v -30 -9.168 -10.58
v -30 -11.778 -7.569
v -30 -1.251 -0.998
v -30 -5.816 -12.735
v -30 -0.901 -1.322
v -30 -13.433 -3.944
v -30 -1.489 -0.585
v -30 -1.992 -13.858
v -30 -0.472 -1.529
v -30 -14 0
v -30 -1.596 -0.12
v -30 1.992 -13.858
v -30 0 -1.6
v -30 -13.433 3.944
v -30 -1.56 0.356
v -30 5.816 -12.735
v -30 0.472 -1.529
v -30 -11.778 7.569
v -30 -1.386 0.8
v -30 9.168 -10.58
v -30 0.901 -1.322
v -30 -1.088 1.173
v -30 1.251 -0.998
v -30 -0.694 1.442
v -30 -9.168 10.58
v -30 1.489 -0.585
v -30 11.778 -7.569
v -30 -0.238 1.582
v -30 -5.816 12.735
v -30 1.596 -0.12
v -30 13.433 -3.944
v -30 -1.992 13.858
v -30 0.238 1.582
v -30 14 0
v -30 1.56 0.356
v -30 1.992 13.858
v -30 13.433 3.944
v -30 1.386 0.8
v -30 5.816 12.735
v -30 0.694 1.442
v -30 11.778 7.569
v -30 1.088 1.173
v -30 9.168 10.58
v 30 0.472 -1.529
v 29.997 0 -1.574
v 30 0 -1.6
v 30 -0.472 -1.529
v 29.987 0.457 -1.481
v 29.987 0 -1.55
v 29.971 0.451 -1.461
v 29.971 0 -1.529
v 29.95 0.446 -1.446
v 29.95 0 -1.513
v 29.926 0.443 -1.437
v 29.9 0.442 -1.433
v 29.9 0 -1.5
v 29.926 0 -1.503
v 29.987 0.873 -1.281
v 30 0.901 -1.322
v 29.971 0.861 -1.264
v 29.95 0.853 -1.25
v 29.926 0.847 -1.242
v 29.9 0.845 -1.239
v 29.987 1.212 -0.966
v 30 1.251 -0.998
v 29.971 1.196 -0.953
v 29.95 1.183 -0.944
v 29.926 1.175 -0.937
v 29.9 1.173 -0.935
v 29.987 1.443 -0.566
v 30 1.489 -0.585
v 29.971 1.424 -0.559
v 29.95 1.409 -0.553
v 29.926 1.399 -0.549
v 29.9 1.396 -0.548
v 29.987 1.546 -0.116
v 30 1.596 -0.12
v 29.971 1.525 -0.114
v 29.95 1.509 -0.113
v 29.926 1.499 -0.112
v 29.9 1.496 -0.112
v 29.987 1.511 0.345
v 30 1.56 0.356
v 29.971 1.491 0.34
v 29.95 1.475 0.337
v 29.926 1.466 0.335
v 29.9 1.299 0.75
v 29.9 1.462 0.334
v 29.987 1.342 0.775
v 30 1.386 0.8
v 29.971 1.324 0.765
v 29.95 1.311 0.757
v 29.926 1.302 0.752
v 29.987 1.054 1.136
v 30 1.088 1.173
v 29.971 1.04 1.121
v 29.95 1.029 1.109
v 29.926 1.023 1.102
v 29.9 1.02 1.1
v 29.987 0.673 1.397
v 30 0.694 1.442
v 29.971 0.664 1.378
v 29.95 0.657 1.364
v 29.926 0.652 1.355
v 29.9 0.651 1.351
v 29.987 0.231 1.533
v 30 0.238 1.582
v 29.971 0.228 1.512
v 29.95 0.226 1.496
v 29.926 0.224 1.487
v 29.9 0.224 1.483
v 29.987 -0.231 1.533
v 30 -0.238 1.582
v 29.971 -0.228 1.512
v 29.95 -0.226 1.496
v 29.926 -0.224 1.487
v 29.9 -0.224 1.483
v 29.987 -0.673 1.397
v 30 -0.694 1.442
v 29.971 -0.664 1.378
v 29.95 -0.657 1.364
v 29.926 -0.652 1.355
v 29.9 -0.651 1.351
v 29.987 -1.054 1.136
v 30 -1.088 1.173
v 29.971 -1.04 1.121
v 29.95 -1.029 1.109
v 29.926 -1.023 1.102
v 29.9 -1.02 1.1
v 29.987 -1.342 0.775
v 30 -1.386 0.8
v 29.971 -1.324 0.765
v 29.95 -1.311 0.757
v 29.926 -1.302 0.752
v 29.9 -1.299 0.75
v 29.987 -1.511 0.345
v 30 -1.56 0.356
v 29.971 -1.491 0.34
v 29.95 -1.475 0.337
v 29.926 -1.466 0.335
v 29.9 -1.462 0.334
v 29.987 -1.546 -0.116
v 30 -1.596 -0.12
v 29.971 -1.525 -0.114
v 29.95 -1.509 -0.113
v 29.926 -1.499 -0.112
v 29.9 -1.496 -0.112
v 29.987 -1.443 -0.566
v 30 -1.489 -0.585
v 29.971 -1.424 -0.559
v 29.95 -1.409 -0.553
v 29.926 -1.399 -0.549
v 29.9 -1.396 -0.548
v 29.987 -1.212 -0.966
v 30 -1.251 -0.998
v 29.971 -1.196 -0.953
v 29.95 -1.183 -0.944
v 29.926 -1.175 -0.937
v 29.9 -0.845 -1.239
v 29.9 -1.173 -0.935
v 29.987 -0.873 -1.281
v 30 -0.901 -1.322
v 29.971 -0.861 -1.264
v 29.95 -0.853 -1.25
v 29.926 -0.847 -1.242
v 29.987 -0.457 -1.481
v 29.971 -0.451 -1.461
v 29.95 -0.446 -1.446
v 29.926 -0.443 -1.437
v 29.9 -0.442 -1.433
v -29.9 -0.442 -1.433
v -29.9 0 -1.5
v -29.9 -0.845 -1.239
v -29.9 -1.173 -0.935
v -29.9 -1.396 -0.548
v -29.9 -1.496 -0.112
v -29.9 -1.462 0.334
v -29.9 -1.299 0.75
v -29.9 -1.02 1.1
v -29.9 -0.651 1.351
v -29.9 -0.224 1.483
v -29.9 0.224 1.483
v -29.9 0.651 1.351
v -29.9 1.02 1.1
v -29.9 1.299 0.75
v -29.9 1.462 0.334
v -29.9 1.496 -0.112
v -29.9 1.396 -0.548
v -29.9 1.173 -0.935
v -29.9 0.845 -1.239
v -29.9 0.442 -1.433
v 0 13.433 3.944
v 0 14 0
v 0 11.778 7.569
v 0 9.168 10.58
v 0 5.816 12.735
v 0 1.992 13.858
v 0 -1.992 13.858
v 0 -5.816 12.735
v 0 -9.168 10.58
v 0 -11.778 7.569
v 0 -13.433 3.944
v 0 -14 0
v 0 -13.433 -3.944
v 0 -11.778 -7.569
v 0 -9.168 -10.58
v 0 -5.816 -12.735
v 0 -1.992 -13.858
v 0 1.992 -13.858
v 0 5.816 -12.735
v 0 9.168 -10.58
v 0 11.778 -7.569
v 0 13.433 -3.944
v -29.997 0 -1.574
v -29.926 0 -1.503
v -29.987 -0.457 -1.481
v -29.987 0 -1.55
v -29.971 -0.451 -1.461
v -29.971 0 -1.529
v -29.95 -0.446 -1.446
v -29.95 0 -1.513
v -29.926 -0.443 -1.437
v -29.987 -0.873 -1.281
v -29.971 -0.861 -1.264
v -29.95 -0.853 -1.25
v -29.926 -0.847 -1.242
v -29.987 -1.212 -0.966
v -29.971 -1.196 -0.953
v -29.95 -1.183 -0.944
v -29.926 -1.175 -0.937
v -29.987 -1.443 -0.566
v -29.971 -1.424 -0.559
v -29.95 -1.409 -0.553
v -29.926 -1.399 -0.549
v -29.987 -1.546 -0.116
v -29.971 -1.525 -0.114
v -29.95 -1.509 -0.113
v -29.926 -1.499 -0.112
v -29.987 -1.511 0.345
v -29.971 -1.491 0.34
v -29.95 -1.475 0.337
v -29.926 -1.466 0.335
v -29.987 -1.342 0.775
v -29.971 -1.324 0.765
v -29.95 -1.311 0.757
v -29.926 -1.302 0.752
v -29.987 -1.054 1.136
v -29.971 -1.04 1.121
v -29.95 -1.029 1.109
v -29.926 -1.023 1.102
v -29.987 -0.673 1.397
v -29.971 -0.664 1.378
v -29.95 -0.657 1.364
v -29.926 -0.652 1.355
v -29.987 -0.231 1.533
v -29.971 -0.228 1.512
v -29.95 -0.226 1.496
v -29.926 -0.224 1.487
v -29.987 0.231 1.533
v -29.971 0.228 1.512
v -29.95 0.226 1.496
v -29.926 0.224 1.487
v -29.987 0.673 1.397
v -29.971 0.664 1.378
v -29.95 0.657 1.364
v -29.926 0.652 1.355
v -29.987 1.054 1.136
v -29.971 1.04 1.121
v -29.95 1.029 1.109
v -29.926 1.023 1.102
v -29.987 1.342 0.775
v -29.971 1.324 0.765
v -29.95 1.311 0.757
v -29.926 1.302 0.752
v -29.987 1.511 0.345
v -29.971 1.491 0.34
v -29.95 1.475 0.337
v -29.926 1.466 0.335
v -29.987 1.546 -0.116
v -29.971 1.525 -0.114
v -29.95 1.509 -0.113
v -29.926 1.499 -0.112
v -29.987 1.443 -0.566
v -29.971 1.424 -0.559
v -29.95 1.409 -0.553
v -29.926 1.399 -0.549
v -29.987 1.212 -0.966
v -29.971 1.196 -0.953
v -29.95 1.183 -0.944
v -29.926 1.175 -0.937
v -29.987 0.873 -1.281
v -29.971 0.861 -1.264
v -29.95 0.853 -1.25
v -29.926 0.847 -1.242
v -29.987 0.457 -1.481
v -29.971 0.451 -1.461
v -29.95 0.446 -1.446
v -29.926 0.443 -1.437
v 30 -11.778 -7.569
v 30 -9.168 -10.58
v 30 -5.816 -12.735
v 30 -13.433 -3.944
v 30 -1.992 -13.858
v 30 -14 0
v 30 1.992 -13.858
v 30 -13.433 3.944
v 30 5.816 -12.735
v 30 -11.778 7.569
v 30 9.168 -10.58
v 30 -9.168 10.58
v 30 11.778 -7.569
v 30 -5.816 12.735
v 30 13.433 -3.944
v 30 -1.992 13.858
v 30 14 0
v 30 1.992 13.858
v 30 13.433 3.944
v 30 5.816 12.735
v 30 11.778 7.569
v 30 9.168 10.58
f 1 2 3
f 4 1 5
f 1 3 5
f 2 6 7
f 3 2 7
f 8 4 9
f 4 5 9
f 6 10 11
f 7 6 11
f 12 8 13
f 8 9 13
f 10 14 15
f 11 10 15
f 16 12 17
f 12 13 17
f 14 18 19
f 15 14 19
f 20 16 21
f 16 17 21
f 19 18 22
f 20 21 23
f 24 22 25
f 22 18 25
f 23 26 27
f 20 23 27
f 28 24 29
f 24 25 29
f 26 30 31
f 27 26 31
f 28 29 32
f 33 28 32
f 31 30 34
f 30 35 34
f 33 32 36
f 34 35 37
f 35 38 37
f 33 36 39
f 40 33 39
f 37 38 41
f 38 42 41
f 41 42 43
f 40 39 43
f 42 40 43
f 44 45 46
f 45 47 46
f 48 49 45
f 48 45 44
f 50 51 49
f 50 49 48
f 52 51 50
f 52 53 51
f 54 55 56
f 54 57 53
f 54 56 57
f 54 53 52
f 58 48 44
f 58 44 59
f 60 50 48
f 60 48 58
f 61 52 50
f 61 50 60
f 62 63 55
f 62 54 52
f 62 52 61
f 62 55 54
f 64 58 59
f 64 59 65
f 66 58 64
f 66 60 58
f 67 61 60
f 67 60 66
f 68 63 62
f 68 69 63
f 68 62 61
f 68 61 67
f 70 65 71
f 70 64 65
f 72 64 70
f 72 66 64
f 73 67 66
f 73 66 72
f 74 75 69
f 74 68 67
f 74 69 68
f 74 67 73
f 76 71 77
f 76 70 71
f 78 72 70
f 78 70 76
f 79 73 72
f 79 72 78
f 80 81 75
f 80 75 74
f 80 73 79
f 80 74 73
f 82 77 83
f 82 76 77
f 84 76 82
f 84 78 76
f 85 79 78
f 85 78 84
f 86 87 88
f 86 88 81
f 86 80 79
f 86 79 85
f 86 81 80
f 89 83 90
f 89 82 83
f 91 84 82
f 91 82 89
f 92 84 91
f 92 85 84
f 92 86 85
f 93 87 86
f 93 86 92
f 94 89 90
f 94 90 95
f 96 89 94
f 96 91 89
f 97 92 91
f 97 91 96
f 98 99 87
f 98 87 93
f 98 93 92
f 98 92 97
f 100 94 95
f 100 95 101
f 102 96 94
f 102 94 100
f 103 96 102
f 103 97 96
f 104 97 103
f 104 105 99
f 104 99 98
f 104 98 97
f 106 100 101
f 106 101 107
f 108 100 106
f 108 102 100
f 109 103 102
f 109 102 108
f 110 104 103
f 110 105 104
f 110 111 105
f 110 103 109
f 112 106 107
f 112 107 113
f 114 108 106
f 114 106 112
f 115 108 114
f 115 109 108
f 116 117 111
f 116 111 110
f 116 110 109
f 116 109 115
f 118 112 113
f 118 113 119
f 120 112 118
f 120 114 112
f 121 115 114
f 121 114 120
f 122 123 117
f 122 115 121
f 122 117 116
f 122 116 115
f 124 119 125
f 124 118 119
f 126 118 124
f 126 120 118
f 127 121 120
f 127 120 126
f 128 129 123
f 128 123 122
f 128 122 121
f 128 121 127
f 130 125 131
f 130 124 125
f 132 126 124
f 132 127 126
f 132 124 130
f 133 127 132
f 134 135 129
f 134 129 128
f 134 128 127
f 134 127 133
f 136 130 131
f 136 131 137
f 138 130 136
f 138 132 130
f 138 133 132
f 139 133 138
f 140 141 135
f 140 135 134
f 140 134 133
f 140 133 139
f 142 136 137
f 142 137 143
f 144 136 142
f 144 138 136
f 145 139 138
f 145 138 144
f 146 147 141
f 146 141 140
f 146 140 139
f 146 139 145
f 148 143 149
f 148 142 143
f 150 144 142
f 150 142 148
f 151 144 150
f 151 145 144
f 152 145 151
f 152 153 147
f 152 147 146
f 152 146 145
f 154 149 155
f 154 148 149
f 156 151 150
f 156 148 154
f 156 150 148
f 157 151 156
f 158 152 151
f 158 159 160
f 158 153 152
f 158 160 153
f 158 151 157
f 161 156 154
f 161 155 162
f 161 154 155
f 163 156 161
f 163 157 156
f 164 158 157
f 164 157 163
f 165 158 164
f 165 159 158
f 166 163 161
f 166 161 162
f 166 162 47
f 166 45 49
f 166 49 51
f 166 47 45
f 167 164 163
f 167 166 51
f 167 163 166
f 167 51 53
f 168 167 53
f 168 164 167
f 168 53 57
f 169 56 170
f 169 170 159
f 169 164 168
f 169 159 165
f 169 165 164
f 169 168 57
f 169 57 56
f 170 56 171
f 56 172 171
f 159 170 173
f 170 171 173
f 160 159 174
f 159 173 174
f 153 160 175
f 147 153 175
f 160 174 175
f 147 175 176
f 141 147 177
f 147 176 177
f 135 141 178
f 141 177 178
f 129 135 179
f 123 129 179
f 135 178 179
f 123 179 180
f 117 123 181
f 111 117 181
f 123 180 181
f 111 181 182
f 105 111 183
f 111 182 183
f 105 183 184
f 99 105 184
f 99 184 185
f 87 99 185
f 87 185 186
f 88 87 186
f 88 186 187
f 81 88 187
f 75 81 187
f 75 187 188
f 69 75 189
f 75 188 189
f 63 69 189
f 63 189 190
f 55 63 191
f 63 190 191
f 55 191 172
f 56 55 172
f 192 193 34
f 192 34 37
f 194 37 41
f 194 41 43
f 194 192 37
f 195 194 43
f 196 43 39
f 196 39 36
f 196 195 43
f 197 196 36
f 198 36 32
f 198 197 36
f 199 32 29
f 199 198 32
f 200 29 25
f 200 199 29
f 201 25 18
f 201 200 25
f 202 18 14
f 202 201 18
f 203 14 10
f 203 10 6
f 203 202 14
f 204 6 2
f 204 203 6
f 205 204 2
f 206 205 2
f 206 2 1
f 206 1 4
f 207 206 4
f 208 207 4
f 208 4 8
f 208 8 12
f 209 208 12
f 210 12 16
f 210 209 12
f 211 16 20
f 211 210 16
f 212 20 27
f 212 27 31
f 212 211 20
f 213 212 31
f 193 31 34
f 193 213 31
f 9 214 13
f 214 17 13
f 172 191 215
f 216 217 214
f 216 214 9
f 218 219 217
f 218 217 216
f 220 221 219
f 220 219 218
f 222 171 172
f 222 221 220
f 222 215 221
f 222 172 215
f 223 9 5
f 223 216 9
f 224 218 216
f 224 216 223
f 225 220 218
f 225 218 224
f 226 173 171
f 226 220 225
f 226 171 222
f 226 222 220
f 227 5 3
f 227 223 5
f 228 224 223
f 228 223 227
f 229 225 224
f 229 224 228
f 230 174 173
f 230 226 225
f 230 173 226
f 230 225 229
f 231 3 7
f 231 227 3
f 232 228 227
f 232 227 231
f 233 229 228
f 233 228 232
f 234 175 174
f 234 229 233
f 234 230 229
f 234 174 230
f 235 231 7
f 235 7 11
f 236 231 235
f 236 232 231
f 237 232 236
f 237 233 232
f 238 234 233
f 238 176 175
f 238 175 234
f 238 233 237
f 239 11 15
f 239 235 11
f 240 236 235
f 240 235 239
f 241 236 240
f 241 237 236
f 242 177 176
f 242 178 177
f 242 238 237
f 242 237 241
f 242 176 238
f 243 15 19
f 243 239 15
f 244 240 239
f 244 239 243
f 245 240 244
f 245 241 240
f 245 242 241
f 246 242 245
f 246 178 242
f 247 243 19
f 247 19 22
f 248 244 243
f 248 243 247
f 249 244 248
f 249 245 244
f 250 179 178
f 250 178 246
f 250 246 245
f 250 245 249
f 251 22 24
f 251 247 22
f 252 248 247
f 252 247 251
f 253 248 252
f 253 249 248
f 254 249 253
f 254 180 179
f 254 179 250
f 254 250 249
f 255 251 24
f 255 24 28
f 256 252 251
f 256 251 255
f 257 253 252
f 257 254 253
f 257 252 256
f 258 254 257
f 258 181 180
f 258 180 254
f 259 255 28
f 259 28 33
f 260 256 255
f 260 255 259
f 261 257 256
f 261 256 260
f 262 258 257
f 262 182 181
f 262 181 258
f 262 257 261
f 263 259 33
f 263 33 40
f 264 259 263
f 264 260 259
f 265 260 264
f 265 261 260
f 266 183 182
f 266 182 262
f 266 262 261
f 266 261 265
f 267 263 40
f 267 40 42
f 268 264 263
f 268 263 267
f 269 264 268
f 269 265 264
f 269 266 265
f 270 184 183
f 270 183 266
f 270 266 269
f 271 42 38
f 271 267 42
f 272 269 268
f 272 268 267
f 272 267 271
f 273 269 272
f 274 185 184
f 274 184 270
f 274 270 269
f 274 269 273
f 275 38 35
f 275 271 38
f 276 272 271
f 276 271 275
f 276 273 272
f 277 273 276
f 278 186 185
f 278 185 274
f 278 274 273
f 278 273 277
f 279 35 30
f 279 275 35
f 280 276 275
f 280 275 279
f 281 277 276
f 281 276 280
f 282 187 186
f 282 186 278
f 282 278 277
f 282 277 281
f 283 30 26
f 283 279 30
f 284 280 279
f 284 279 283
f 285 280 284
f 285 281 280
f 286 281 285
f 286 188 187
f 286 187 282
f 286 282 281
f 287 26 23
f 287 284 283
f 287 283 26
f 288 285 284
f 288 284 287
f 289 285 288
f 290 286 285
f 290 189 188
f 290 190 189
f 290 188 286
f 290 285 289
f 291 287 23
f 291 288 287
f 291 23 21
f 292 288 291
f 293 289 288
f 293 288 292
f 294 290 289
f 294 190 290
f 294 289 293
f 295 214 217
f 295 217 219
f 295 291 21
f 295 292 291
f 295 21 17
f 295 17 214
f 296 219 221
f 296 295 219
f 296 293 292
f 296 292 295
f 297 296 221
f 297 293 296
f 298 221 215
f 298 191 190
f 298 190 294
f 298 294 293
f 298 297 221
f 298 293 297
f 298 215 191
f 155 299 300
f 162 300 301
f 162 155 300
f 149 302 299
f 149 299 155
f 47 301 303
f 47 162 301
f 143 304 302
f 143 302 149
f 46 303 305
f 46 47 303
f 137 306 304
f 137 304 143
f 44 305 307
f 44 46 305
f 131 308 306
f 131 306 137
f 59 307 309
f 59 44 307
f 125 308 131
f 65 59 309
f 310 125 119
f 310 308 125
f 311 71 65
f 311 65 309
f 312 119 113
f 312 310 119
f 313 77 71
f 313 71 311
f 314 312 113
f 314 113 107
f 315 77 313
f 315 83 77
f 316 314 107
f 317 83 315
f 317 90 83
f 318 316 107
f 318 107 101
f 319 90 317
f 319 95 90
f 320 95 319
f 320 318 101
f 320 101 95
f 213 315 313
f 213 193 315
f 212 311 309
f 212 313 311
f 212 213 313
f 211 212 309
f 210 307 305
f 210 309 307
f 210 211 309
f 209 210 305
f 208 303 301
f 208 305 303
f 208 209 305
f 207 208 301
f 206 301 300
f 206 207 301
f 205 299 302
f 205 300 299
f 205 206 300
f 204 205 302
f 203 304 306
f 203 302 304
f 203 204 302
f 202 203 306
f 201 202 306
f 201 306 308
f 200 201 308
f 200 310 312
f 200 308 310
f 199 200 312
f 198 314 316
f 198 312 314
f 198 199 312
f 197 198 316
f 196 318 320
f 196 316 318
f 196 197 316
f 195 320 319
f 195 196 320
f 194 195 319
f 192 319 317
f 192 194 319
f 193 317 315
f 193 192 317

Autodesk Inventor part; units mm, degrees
ref_plane "YZ Plane" through (0, 0, 0) normal (1, 0, 0) x (0, 1, 0)
ref_plane "XZ Plane" through (0, 0, 0) normal (0, 1, 0) x (-1, 0, 0)
ref_plane "XY Plane" through (0, 0, 0) normal (0, 0, 1) x (1, 0, 0)
sketch "Эскиз1" plane through (0, 0, 0) normal (1, 0, 0) x (0, 1, 0)
  circle A0 centre (0, 0) radius 14
  dimension "d0" = 28
extrude "Выдавливание1" add sketch "Эскиз1" along normal mid plane 60
sketch "Эскиз2" plane through (30, 0, 0) normal (1, 0, 0) x (0, 0, -1)
  point P0 (0, 0)
  point P1 (0, 0)
hole "Отверстие1" at (30, 0, 0) direction (-1, 0, 0) diameter 3 depth 60
fillet "Сопряжение1" radius 0.1 2 edges at (-30, 0, 1.5) (30, 0, 1.5)
properties part number "Вал конвейера 2"
